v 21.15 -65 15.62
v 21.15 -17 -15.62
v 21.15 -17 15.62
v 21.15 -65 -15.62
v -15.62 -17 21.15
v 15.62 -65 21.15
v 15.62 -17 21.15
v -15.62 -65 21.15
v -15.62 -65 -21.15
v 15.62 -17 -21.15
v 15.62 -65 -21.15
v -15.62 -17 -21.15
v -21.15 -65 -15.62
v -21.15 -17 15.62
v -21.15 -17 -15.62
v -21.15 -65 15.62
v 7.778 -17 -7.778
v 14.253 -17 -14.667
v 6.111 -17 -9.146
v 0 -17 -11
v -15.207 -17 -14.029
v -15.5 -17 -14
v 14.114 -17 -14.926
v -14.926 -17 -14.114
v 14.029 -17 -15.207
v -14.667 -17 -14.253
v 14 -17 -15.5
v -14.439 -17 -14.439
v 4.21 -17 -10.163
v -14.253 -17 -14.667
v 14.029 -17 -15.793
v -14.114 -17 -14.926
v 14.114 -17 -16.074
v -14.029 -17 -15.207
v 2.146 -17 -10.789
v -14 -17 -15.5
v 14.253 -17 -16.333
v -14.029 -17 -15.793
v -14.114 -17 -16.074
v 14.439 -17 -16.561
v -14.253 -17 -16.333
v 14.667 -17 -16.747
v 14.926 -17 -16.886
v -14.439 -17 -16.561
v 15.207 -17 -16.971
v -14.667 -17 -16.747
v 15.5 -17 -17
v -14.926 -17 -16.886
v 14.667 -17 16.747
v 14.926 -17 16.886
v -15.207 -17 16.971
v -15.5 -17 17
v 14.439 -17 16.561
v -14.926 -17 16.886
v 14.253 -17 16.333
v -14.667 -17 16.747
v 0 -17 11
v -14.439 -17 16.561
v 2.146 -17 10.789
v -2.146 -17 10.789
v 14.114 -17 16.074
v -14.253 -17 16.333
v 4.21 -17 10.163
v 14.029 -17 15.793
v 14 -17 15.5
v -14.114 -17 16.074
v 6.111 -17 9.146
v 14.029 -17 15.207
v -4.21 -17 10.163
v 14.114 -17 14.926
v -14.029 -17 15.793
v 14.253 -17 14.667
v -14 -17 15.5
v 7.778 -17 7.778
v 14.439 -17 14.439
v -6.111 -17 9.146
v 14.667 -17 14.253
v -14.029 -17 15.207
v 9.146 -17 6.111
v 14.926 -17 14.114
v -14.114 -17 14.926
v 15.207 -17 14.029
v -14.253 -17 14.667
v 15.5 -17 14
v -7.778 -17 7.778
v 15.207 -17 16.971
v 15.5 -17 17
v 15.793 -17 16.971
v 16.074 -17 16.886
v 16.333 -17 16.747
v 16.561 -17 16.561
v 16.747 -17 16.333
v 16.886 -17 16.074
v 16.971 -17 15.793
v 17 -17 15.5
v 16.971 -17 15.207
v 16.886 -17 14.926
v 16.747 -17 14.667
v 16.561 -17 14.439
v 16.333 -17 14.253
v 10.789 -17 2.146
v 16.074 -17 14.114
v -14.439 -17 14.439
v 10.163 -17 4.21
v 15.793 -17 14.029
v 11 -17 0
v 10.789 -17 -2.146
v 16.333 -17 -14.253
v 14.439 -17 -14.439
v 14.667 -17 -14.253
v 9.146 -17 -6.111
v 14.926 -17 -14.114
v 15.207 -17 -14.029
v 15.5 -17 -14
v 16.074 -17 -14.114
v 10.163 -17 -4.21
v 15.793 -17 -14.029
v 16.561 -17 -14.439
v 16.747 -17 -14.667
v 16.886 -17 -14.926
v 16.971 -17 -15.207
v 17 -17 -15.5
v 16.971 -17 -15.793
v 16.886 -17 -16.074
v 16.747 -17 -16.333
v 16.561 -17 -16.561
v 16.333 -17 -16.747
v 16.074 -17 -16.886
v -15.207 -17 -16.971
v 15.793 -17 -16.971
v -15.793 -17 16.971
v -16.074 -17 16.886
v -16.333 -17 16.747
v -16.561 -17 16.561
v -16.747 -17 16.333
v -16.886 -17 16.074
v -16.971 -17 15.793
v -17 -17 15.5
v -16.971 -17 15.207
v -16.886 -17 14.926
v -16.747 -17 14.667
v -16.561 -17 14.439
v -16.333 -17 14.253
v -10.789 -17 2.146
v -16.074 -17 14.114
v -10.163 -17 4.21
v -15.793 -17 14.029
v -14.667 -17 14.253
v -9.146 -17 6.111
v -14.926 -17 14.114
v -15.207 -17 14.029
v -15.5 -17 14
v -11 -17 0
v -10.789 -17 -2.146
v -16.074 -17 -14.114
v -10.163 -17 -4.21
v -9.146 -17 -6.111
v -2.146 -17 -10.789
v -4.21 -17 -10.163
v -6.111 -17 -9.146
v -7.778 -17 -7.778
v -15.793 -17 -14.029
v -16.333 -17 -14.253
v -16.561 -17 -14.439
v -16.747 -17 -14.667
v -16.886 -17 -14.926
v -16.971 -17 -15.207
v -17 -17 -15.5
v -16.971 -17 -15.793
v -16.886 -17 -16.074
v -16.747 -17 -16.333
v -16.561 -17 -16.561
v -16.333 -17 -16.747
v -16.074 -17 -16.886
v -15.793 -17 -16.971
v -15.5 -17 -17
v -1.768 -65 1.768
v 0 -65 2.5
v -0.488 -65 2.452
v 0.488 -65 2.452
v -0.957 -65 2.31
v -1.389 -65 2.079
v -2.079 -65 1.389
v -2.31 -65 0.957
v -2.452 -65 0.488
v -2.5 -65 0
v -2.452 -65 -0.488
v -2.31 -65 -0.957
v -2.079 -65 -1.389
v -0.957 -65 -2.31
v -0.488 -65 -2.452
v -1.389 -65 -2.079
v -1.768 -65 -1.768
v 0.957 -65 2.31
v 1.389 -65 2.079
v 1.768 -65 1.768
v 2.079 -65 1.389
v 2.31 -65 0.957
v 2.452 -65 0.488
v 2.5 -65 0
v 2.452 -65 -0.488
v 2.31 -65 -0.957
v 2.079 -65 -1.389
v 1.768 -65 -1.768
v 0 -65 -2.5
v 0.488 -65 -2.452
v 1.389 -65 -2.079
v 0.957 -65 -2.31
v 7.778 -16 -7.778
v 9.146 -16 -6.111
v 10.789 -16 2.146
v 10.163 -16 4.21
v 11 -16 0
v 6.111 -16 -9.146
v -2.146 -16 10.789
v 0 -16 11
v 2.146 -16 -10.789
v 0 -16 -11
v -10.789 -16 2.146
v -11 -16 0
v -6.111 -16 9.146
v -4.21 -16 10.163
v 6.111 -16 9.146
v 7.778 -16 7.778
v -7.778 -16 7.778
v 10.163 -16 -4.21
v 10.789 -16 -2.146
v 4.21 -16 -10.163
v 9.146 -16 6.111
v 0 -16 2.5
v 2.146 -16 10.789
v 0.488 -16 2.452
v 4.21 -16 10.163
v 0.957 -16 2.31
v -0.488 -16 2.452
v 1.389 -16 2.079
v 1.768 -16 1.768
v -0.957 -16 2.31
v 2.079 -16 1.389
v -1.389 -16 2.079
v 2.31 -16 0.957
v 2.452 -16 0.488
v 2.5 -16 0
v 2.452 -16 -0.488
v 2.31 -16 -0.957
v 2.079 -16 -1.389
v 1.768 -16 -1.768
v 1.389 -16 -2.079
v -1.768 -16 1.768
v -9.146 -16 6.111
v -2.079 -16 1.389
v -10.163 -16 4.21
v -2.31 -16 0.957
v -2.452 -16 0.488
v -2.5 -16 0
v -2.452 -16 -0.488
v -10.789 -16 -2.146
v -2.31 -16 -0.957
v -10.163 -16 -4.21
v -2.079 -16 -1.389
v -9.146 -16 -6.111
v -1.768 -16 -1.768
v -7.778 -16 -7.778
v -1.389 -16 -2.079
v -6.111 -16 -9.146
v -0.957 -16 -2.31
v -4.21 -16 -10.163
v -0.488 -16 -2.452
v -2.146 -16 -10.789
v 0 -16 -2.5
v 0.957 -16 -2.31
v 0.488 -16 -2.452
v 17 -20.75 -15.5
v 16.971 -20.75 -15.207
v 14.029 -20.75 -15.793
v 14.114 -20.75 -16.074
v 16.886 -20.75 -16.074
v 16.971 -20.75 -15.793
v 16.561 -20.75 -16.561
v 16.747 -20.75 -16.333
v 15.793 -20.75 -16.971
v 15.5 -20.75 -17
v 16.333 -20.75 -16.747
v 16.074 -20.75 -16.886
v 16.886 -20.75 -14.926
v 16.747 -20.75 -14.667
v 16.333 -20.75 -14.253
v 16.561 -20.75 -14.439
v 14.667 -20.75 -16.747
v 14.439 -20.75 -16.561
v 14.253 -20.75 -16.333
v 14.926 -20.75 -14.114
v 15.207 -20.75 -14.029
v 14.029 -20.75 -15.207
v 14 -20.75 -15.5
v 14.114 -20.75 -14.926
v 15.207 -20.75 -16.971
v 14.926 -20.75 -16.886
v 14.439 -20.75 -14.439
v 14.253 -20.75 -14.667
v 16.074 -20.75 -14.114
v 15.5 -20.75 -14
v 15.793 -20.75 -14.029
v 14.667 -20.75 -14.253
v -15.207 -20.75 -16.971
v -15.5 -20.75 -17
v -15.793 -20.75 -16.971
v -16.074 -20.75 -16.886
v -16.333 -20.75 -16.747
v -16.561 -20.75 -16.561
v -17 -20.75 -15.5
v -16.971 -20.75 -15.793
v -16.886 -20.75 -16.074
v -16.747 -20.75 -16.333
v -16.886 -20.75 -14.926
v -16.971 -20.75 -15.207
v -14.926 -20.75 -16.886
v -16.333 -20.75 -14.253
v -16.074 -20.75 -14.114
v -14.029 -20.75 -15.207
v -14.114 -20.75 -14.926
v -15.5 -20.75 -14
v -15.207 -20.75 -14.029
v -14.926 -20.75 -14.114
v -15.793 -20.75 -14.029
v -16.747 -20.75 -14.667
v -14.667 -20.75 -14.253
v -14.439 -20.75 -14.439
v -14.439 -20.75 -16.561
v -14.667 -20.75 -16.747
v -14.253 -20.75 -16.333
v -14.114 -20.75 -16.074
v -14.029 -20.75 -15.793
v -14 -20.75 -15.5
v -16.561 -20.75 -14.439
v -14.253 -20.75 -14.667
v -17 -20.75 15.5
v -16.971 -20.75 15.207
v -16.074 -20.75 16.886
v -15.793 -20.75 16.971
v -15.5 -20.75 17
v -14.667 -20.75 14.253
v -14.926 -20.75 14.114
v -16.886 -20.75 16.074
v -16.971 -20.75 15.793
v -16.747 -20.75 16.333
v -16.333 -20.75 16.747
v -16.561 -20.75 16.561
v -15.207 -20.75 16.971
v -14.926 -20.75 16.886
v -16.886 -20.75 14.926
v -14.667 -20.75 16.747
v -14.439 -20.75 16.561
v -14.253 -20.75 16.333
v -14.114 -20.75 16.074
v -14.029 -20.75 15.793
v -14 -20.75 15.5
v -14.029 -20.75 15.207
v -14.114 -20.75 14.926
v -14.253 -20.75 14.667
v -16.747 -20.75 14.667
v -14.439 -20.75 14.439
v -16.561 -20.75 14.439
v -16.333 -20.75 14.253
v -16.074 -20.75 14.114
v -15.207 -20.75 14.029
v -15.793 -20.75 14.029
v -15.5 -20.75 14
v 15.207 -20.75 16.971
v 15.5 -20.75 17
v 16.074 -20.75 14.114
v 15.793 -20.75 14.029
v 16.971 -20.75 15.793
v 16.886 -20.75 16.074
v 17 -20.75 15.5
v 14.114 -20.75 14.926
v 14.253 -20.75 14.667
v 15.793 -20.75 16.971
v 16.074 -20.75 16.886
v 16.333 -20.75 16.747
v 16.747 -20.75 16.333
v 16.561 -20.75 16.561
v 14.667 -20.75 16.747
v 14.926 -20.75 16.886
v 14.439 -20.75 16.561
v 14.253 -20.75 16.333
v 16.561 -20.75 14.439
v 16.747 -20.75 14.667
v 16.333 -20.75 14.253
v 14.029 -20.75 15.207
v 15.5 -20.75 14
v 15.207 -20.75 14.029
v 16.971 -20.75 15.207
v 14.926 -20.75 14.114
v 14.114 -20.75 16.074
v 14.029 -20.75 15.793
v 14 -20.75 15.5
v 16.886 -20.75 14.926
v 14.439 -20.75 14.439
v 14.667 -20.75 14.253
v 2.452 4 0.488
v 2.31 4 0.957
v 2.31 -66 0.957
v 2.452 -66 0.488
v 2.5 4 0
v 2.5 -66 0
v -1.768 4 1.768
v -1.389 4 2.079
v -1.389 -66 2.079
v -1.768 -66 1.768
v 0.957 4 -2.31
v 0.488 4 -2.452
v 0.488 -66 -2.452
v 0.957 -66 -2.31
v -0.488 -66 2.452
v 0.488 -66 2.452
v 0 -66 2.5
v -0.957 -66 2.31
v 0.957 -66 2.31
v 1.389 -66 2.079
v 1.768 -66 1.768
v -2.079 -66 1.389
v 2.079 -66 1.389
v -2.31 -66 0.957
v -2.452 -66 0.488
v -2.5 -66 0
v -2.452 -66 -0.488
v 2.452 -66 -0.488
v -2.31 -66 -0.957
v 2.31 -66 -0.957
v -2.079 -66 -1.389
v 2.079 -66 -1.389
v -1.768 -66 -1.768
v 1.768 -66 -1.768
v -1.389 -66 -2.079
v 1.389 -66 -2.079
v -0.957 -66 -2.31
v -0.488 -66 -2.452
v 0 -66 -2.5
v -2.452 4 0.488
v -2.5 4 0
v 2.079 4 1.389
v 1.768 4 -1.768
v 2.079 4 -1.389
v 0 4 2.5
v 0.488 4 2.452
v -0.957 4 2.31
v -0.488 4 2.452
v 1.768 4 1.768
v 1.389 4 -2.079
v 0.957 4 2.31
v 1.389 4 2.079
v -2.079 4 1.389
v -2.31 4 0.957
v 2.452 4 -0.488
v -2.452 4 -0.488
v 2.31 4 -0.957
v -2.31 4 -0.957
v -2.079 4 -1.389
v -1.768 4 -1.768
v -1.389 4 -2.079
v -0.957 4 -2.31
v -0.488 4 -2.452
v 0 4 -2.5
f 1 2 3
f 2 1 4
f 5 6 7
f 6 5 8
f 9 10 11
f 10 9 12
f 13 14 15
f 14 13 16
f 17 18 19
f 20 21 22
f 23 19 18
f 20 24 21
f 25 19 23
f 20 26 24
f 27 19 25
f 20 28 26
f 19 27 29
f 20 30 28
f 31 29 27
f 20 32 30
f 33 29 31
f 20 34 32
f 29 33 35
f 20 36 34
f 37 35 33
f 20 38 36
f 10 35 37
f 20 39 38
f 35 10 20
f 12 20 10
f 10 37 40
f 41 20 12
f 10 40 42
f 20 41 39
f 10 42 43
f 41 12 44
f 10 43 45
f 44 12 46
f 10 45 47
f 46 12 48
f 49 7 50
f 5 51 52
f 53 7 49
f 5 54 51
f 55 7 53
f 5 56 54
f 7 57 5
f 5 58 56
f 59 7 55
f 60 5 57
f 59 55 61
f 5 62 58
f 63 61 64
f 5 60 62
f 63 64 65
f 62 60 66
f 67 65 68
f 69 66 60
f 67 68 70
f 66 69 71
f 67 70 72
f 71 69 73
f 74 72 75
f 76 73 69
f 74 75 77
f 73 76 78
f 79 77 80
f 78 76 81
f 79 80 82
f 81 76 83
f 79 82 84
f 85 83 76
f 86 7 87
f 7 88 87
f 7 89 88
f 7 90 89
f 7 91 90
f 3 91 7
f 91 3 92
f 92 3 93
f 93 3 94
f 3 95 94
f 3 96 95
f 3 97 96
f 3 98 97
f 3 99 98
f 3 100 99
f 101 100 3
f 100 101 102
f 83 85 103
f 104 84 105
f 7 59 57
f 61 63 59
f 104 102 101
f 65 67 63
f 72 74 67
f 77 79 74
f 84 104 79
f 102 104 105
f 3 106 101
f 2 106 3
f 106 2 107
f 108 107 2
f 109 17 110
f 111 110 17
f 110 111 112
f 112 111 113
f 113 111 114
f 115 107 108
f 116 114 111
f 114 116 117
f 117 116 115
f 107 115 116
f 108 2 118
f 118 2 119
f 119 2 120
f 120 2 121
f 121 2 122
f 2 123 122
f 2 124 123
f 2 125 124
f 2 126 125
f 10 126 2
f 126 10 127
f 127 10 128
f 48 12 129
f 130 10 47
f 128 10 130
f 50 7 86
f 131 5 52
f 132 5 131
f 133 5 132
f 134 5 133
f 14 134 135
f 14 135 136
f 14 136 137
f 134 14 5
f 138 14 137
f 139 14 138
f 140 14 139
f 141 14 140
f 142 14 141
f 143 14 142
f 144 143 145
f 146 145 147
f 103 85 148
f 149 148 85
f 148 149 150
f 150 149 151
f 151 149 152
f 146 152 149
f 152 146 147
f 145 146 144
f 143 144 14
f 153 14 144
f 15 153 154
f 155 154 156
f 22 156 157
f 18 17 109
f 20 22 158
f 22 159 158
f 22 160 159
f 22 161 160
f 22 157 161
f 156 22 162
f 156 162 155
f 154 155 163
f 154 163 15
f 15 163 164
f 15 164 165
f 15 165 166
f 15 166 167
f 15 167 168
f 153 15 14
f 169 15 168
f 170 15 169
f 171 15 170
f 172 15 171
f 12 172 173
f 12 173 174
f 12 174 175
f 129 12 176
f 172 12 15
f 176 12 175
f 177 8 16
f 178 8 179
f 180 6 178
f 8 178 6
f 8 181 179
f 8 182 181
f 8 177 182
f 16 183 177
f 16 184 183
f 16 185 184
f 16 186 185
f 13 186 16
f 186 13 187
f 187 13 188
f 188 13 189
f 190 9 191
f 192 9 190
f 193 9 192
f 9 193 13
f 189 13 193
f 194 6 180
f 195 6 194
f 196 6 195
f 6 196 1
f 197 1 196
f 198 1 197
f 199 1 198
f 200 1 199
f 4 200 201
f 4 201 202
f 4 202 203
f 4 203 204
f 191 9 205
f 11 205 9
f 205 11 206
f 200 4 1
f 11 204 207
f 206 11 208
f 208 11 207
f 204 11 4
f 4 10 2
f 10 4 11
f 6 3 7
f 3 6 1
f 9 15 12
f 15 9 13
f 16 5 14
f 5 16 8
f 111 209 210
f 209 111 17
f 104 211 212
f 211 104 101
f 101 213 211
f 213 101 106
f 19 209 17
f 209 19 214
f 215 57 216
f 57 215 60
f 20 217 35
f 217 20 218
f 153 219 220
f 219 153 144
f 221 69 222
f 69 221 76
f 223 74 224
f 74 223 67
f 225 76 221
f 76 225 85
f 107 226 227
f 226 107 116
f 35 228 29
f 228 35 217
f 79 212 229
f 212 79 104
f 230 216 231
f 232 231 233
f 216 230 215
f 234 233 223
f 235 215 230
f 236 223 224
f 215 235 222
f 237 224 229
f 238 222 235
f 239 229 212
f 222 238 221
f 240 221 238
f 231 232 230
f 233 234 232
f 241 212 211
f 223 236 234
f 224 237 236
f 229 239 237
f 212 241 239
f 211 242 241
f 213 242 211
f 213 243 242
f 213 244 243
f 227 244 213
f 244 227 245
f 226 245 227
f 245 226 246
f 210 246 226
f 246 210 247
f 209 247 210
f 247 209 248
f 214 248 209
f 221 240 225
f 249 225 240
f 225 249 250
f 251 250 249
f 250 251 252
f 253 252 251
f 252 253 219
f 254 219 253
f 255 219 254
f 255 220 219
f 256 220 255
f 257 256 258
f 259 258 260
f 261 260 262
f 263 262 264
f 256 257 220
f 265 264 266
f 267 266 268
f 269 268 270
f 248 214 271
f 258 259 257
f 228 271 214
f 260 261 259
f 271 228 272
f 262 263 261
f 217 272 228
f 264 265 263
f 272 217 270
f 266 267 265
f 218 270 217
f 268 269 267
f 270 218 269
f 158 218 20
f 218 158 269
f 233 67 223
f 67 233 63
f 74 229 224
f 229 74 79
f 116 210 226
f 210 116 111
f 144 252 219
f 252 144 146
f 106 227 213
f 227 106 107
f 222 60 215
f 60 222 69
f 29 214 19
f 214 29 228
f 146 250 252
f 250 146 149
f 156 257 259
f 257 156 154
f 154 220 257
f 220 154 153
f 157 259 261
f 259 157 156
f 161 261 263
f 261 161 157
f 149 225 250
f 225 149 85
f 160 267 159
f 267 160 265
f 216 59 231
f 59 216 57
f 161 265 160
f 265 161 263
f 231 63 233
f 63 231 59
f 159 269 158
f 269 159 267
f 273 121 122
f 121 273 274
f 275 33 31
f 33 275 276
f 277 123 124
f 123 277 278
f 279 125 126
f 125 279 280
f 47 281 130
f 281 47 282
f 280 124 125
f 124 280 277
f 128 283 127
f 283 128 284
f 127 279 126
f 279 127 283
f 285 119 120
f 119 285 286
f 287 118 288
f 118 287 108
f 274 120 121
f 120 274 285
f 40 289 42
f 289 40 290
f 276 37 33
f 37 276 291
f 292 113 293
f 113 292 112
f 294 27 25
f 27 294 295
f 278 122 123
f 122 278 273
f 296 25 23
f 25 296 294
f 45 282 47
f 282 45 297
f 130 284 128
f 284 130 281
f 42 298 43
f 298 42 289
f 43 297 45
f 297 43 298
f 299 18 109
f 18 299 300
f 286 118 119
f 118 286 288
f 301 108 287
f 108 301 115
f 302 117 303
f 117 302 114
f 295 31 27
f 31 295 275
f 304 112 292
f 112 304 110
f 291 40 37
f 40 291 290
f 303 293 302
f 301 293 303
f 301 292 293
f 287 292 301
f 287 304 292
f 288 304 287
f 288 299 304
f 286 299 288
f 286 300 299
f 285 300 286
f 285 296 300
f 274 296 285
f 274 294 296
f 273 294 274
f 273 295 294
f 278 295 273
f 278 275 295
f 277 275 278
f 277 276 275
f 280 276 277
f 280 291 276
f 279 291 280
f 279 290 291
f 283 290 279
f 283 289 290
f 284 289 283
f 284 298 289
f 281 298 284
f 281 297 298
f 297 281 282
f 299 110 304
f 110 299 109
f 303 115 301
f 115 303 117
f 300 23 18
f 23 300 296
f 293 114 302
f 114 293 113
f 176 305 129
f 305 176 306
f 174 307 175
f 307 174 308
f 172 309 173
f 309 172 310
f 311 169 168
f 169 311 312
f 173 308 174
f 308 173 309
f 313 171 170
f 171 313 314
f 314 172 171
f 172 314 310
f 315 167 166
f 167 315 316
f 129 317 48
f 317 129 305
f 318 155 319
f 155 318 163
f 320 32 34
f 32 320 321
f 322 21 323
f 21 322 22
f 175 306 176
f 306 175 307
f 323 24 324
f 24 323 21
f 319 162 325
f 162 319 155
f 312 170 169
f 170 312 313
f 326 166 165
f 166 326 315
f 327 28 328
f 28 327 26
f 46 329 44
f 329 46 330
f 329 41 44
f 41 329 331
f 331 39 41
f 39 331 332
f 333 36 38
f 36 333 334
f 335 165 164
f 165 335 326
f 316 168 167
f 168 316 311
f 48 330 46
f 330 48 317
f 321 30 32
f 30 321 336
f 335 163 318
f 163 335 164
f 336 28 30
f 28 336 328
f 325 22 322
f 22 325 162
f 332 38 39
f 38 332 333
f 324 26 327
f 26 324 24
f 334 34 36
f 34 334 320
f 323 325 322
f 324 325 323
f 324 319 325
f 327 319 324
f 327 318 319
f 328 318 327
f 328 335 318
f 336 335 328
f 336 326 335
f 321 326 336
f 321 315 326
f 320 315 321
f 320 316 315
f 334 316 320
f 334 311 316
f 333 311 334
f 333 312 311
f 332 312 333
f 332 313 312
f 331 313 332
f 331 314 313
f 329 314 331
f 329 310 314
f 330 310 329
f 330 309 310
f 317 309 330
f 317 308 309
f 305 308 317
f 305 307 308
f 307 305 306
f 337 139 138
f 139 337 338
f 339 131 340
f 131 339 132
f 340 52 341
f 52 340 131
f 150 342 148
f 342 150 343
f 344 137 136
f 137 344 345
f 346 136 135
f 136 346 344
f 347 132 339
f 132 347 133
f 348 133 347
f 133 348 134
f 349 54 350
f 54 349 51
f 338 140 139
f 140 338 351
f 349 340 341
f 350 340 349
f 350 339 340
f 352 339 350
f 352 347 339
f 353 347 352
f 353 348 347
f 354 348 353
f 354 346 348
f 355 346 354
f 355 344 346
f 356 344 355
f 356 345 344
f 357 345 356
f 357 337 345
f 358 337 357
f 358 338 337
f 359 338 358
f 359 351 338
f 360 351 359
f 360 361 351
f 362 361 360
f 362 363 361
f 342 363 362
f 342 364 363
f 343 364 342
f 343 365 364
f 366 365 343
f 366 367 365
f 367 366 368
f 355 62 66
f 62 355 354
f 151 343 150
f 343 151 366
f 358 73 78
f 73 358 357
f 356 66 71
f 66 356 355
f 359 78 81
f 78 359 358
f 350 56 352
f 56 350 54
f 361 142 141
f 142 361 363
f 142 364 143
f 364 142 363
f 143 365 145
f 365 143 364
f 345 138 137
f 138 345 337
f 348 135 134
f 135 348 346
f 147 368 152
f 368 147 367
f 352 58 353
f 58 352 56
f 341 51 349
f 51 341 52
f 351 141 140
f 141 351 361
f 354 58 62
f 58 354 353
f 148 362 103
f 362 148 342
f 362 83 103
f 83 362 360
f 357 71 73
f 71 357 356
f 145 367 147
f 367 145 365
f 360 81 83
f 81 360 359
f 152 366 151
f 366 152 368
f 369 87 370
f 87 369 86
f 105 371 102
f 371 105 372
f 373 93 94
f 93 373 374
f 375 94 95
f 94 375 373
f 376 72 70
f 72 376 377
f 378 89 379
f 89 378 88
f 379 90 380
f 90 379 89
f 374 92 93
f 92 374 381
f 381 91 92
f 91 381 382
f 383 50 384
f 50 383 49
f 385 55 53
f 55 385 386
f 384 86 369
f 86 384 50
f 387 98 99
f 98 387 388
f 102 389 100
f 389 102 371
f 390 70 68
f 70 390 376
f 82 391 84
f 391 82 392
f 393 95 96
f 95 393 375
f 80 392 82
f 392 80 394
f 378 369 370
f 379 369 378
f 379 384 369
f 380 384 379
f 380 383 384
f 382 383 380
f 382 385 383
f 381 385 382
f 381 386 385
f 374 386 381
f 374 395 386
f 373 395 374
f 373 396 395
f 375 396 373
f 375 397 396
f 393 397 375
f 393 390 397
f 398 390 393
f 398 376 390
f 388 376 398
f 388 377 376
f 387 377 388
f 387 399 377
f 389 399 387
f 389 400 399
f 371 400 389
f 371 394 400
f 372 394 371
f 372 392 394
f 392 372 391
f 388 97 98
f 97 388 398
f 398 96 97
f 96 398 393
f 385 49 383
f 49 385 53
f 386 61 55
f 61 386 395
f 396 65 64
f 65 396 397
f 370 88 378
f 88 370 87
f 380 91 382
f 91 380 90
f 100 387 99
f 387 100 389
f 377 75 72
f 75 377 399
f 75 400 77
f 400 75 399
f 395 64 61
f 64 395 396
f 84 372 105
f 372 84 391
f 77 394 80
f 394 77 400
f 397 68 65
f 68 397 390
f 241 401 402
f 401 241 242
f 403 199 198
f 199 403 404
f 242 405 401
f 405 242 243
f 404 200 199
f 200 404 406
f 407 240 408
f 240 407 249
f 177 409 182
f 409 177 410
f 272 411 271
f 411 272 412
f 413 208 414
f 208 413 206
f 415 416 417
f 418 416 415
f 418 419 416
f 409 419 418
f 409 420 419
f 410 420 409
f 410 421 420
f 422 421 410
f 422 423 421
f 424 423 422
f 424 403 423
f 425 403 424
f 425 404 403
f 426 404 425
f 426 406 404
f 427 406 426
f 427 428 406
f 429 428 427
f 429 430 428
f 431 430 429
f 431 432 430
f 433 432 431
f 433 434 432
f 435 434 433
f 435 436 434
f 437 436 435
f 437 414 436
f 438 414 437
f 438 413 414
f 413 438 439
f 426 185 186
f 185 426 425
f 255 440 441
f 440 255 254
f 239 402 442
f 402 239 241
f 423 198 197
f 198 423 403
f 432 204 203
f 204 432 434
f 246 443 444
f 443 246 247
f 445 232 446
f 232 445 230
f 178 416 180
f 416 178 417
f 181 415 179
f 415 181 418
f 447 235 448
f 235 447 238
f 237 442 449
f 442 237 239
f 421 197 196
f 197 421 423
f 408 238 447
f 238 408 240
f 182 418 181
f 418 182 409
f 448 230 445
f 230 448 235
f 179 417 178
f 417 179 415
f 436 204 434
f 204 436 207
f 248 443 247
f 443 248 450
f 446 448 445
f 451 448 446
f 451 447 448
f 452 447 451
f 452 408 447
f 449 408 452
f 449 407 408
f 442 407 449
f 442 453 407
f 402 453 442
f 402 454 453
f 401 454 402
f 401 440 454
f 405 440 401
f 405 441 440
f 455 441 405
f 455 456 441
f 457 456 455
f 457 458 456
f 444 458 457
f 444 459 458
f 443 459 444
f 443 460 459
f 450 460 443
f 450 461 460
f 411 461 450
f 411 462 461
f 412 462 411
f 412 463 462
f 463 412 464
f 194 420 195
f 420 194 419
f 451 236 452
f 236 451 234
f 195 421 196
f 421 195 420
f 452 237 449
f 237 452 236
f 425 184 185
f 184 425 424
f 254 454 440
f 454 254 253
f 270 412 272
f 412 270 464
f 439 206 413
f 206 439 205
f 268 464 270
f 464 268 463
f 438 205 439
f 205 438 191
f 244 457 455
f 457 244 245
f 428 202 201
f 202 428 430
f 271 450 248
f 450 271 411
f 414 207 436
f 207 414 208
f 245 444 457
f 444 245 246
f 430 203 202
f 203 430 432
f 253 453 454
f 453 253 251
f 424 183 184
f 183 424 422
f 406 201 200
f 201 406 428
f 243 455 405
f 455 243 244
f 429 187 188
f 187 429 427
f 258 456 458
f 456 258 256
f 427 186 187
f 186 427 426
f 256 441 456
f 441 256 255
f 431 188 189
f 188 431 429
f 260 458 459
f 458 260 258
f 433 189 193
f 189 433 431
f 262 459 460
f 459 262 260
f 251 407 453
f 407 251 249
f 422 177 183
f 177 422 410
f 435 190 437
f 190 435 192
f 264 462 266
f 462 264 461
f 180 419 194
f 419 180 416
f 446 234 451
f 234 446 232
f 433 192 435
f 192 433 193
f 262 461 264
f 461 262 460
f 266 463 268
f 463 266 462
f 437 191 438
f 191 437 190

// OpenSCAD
/*
NEMA 17
*/

$fa = 2;   // Minimum angle for circle segments.
$fs = 0.5; // Minimum size for circle segments.
$fn = 32;
aluminum = [0.9, 0.9, 0.9];
steel = [0.8, 0.8, 0.9];

motor_screw = 15.5;
motor_diagonal = sqrt(2 * motor_screw * motor_screw);

module nema17(length) 
{
  color([0.7, 0.7, 0.7])
difference() 
{
    {
            render() 
            {
            translate([0, -length/2-17, 0])
            intersection() 
            {
                cube([42.3, length, 42.3], center=true);
                rotate([0, 45, 0]) cube([52, length, 52], center=true);
            }
            translate([0, -17, 0]) rotate([90, 0, 0])
            cylinder(r=11, h=2, center=true);
            }

    }
          for(i=[1:4])
      {
          rotate([0, 90*i, 0])
          translate([31/2, -18.5, 31/2]) rotate([90, 0, 0])
          cylinder(d=3, h=4.5, center=true);
      }
}
        color(steel)
        translate([0, -length/2-7, 0]) rotate([90, 0, 0])
        cylinder(r=2.5, h=length+22, center=true);
}



nema17(48);
